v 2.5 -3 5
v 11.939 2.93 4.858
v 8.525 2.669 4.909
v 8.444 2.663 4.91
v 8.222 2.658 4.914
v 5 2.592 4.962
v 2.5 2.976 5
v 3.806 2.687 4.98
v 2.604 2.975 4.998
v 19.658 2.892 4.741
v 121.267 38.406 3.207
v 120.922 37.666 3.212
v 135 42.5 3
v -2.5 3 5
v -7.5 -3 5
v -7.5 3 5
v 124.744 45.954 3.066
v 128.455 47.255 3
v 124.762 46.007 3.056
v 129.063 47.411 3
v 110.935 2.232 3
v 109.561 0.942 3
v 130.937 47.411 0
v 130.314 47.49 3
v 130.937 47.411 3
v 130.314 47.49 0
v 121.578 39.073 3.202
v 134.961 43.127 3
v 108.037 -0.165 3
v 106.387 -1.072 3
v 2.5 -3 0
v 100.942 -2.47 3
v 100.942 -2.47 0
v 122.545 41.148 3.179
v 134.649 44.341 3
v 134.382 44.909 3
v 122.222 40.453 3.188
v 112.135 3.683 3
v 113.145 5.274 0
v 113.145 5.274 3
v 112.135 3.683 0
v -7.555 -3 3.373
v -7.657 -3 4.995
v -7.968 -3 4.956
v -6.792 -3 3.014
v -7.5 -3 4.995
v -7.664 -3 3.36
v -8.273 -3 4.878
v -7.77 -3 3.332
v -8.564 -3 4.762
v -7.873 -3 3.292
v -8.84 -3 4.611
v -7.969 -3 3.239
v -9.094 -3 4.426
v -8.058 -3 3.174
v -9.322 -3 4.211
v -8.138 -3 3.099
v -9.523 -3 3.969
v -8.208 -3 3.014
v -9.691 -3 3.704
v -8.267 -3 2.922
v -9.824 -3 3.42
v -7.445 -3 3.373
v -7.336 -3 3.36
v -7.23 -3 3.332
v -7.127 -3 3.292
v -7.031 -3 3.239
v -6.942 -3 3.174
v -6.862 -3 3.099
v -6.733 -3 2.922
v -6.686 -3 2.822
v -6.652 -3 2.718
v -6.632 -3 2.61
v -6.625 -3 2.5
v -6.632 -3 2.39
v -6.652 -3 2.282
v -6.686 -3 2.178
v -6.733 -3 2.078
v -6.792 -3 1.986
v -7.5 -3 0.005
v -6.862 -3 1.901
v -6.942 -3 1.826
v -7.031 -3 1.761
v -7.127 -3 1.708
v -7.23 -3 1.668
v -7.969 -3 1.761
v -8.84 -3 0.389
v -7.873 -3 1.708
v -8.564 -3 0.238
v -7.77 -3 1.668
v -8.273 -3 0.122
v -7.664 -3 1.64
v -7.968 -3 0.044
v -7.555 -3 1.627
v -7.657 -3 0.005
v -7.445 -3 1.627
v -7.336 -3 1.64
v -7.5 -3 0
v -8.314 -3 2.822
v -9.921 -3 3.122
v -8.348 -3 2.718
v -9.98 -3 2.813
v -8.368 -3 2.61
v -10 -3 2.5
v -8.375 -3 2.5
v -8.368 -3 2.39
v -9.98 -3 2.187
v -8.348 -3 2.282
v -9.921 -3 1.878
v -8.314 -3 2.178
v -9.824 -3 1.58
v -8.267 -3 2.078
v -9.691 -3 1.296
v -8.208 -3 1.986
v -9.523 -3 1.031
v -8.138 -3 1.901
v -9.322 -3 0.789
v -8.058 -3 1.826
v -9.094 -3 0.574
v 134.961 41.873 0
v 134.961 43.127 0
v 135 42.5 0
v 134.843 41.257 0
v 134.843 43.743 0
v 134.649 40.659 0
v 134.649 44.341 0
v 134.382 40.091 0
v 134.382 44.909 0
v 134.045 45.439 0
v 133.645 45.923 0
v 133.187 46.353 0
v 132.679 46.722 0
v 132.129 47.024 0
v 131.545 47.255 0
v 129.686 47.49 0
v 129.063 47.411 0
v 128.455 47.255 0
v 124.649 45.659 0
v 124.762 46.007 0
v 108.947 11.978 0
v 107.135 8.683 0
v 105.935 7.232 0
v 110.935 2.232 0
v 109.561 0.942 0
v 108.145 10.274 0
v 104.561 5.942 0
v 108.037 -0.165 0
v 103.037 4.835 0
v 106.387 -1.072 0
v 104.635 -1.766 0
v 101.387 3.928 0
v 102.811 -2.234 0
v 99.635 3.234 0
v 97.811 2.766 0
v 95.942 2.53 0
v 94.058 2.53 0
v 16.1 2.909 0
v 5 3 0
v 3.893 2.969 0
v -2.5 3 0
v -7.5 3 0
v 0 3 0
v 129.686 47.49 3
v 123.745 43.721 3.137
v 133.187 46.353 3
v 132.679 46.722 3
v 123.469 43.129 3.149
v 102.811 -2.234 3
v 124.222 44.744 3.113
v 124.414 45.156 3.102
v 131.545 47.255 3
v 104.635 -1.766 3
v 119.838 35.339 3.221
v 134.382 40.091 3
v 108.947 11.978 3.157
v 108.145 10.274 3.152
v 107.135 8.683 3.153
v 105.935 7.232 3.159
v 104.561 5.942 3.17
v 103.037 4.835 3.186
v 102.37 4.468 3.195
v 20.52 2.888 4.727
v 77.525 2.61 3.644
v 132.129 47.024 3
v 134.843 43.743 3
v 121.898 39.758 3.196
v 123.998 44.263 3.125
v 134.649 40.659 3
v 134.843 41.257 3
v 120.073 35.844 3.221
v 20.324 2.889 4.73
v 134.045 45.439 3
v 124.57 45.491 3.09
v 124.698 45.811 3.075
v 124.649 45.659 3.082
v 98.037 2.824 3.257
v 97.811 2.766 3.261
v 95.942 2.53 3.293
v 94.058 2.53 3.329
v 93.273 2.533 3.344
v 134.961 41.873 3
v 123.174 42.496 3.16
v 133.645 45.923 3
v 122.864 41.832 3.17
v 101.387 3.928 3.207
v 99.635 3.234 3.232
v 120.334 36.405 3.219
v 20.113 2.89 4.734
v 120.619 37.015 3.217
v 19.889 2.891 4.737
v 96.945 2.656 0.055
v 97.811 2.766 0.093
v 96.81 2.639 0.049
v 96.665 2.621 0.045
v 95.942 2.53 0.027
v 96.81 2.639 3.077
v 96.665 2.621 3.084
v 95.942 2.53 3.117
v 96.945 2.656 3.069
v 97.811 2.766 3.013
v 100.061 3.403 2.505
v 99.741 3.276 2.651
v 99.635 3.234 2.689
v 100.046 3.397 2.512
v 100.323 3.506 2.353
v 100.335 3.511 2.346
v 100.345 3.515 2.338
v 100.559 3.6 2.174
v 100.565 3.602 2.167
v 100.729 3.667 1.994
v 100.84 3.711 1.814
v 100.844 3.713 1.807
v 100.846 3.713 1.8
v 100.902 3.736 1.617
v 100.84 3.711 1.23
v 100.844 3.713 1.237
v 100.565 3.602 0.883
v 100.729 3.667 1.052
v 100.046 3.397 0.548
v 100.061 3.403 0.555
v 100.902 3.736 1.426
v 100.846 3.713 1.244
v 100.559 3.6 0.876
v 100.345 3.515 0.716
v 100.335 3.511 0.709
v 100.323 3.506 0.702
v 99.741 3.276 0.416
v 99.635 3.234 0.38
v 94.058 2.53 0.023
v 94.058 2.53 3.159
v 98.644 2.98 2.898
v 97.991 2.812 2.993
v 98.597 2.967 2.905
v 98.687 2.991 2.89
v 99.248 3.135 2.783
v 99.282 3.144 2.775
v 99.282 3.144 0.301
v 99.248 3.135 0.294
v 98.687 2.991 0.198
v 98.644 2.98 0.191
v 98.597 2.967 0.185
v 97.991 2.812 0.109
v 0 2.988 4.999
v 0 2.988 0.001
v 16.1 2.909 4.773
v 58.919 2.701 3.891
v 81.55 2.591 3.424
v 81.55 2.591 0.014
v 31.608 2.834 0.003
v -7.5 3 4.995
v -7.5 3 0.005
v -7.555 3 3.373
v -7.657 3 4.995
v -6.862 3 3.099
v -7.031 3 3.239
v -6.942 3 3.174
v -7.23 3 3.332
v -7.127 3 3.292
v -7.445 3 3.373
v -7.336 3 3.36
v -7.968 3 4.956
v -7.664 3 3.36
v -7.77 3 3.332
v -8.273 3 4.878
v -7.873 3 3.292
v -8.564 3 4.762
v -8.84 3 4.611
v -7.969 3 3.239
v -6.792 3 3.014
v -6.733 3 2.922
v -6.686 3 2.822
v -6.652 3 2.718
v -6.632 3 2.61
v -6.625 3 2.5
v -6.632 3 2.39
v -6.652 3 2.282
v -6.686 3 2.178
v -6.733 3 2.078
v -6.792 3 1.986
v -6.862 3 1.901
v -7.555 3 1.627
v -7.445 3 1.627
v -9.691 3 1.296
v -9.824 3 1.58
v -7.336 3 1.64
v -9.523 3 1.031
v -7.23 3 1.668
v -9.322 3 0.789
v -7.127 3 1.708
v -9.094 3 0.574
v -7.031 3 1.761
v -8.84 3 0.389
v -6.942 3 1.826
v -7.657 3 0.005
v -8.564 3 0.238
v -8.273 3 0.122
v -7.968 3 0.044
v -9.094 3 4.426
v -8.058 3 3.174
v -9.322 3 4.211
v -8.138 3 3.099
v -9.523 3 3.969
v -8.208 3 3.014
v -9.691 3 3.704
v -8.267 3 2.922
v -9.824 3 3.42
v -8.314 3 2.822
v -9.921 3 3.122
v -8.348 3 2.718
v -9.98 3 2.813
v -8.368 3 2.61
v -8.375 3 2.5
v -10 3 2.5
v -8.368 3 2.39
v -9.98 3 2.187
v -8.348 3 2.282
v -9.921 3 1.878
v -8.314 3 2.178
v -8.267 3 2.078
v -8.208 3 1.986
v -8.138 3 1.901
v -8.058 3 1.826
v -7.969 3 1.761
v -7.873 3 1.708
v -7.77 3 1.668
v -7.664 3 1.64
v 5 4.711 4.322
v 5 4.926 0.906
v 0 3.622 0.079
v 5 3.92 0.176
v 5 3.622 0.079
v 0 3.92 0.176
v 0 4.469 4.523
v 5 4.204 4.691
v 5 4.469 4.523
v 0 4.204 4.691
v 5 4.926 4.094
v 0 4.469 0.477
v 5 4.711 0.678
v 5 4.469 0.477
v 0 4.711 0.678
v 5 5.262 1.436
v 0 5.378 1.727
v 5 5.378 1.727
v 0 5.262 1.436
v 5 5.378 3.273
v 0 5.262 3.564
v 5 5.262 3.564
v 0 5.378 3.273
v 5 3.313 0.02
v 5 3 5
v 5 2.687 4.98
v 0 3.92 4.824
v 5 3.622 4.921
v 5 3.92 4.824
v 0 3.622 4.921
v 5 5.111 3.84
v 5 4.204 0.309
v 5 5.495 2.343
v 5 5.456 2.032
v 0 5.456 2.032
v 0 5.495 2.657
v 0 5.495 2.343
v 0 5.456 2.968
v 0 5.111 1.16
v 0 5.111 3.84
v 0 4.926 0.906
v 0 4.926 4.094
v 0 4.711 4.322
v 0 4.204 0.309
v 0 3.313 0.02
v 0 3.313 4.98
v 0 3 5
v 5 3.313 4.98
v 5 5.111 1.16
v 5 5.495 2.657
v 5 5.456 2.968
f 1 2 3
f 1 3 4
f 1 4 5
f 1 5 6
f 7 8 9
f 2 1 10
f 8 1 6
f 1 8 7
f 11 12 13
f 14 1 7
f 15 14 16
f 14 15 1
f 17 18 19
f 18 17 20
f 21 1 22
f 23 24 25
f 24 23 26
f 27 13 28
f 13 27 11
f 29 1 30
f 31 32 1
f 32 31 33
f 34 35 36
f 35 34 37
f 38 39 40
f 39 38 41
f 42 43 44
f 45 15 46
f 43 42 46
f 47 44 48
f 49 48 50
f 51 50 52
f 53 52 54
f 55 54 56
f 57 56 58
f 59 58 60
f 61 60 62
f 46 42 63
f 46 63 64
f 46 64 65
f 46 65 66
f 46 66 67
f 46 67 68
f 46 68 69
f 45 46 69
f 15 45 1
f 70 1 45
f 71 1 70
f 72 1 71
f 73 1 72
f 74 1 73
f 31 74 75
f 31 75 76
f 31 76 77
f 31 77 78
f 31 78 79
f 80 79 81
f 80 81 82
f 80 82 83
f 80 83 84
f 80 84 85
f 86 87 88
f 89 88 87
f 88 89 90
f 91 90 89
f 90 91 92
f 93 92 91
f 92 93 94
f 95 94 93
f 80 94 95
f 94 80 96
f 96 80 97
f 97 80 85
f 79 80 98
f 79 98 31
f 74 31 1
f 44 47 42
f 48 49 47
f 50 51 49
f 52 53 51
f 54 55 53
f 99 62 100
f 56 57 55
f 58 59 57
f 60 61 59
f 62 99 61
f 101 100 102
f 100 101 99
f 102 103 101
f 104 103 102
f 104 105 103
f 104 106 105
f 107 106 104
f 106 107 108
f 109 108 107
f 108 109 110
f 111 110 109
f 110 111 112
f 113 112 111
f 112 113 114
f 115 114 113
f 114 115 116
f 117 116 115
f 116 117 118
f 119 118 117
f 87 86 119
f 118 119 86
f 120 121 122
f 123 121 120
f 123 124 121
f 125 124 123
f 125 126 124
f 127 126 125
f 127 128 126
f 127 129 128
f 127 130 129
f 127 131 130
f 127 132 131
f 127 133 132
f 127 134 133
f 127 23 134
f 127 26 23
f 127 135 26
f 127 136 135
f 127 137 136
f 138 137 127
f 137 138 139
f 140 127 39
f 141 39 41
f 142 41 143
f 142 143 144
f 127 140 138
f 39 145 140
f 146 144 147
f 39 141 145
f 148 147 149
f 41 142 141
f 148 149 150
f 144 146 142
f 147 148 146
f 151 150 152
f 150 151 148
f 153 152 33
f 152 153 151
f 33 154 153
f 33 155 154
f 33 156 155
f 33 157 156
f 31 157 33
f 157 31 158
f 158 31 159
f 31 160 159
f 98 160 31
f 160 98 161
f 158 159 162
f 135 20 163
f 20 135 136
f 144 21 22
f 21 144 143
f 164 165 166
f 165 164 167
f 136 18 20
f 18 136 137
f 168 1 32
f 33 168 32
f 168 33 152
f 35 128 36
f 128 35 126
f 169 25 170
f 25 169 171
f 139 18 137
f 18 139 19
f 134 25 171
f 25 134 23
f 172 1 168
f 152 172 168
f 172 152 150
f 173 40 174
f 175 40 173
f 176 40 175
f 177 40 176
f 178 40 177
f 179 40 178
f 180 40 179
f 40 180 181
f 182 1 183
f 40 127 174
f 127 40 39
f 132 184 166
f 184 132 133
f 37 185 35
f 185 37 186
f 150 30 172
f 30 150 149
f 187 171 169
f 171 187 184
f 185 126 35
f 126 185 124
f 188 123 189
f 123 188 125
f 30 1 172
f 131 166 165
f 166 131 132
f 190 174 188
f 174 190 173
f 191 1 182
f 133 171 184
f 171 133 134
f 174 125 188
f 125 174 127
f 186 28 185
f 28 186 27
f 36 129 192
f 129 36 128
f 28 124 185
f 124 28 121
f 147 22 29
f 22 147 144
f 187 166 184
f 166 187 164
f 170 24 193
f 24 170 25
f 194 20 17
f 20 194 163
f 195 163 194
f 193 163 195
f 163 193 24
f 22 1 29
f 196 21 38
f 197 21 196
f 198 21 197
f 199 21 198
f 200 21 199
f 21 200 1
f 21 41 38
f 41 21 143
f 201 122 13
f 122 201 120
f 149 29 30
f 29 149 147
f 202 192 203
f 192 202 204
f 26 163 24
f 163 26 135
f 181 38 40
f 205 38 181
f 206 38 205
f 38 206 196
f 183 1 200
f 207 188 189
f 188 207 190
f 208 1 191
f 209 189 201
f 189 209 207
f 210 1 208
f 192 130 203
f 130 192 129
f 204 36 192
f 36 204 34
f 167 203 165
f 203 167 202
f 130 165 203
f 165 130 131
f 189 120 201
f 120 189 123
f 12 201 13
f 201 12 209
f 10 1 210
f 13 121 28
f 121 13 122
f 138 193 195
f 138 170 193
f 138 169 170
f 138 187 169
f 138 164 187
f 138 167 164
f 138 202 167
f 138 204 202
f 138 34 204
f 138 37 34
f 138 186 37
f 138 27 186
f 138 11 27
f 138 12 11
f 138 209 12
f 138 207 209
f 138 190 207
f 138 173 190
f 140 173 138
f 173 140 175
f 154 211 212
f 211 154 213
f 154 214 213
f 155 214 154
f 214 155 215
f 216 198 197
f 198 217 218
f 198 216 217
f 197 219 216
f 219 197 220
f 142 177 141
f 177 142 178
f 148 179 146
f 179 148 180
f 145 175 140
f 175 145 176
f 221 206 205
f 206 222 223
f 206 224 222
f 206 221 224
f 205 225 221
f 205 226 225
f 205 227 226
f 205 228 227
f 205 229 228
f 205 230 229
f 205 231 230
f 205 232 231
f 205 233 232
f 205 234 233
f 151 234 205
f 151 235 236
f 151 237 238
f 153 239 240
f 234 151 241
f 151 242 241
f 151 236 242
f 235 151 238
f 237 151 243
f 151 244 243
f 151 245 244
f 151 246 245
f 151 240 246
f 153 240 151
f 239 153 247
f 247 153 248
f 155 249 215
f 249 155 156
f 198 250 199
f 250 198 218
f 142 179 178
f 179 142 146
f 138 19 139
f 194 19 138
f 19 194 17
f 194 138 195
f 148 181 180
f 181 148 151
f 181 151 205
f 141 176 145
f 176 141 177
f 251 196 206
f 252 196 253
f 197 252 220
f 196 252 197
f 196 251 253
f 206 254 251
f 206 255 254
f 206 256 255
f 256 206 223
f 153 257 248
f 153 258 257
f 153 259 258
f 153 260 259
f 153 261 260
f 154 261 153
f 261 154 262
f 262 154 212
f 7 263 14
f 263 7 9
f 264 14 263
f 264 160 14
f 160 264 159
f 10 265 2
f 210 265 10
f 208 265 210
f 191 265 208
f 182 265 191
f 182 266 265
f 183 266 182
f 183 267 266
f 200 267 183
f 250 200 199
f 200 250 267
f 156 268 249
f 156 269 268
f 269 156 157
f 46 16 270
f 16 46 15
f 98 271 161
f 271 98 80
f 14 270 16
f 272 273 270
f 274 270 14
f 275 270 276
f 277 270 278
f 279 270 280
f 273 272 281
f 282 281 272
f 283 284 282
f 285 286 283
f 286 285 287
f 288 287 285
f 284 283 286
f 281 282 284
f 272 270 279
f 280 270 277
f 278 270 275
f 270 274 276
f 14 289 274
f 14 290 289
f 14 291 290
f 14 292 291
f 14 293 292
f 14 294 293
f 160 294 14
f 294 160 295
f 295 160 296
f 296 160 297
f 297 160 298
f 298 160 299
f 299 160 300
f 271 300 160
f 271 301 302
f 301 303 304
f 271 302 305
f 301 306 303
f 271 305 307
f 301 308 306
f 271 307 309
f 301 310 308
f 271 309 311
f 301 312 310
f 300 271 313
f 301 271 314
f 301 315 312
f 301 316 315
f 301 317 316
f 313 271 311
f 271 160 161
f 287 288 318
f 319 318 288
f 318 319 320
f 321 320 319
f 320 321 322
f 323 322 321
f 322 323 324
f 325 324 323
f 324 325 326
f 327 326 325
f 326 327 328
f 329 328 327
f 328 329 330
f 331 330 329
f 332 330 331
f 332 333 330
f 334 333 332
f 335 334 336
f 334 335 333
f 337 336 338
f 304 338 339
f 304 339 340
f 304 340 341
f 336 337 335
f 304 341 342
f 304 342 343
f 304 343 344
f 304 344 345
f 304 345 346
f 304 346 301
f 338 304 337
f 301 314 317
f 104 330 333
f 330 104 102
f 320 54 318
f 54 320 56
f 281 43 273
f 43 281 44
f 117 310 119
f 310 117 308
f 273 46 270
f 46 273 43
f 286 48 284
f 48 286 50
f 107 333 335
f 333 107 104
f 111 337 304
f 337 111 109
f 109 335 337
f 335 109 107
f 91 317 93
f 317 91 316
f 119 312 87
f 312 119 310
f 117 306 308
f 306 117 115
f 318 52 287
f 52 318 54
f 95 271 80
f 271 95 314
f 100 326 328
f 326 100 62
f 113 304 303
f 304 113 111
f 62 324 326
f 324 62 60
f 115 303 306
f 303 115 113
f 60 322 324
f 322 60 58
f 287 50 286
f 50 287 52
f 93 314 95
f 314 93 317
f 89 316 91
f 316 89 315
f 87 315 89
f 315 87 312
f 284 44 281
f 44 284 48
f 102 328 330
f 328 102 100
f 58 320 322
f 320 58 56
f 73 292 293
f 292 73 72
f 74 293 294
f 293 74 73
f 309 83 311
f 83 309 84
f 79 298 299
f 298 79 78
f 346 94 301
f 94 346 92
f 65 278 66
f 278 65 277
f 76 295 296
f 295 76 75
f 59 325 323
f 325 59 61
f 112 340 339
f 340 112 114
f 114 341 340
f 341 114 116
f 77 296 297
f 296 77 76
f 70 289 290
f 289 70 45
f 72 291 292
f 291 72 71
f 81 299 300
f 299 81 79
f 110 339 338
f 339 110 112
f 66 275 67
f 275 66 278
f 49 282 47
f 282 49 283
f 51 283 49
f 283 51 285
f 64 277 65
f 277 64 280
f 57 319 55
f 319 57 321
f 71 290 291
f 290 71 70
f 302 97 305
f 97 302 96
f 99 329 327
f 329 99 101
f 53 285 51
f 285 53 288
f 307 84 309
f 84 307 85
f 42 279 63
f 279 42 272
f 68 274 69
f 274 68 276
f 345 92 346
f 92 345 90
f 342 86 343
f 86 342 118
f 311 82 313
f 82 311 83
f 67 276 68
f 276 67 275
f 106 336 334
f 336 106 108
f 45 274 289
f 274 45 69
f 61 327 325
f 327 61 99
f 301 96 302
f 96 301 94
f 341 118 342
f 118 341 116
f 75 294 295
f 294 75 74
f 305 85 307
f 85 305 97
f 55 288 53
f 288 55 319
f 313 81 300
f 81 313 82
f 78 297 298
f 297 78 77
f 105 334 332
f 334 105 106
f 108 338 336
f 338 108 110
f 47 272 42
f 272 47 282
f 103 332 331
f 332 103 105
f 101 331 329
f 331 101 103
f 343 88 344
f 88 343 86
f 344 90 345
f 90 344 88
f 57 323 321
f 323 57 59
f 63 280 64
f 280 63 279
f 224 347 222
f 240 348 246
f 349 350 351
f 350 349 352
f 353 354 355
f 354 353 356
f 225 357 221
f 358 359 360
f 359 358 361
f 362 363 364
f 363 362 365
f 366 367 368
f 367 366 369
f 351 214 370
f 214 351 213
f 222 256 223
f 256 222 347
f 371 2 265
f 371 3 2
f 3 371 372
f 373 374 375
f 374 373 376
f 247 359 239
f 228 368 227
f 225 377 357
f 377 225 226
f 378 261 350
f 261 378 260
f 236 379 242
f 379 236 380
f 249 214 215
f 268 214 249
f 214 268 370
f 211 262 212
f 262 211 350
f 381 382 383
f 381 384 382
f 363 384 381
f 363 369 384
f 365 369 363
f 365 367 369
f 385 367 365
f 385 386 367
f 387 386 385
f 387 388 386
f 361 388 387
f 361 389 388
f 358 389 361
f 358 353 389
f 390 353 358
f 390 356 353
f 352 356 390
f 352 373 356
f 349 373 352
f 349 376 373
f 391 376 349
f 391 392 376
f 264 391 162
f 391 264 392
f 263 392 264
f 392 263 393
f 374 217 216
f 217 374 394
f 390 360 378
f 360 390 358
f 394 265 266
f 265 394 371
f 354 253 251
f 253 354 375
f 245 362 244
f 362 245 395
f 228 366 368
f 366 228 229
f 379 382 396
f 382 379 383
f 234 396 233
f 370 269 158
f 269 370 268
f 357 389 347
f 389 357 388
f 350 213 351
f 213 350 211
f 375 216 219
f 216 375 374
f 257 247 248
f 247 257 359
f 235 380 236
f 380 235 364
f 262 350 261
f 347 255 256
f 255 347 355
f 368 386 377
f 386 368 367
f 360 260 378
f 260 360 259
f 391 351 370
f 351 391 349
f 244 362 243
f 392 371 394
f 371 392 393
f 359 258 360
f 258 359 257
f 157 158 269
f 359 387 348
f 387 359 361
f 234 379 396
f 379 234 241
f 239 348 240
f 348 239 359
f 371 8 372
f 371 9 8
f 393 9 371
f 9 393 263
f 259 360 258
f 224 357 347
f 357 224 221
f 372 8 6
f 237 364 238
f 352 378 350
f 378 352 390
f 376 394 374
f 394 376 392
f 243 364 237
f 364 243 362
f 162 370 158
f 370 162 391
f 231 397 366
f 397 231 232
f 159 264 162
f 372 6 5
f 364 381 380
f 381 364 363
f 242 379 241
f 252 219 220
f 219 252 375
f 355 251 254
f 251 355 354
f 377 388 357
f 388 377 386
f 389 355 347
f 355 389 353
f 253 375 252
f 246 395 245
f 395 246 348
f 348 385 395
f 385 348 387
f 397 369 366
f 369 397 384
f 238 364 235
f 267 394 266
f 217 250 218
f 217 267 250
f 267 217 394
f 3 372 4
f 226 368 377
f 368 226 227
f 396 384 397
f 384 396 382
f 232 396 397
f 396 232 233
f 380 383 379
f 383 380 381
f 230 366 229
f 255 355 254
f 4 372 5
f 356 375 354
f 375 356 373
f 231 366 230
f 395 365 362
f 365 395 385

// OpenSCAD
Stem_Length=100;
Stem_Width=5;
Stem_Thickness=3;
Stem_Curve_Length=30;
Hinge_Pin_Diameter=1.75;
Hinge_Width=6;
Hinge_Length=5;
Hinge_Thickness=5;
Slider_Thickness=4;
Tube_Diameter=11;
Tube_Inner_Diameter=8;
Tube_Compressed_Thickness=1.2;
Tube_Compressed_Width=18;
Tube_Holder_Wall_Thickness=3;
Outlet_Tube_Inner_Diameter=3;
$fn=50;


//Plug();

//End_Cap();

//Slider();

Stem();

//Tube_Holder();

module Complete_Syringe(){
translate([30,(Tube_Diameter/3+Tube_Holder_Wall_Thickness),(Tube_Diameter/3+Tube_Holder_Wall_Thickness)])
rotate([90,0,90])
Slider();

translate([0,(Tube_Diameter/3+Tube_Holder_Wall_Thickness),(Tube_Diameter/3+Tube_Holder_Wall_Thickness)])
rotate([90,0,90])
End_Thing();

translate([0,Tube_Diameter/2+Tube_Holder_Wall_Thickness-2,Tube_Diameter/2+Tube_Holder_Wall_Thickness-2])rotate([0,0,90])Tube_Holder();

}


module End_Stop_Plug(){

difference(){

	union(){

		cylinder(2.5, Tube_Inner_Diameter/2+.5, Tube_Inner_Diameter/2+1);

		translate([0,0,2.5])
			cylinder(2.5, Tube_Inner_Diameter/2+.5, Tube_Inner_Diameter/2+1);
	}

	translate([Tube_Inner_Diameter/2+1,0,-1])
		cylinder(7, 1.5, 1.5);

	translate([Tube_Inner_Diameter/-2-1,0,-1])
		cylinder(7, 1.5, 1.5);

}

}
module End_Cap(){

difference(){

	cylinder(5, Tube_Diameter/2+Tube_Holder_Wall_Thickness*2, Tube_Diameter/2+Tube_Holder_Wall_Thickness*2);

	difference(){	
	
		translate([0,0,-1])		
			cylinder(7, Tube_Diameter/2+Tube_Holder_Wall_Thickness, Tube_Diameter/2+Tube_Holder_Wall_Thickness);

		hull(){
		
			translate([0,(Tube_Compressed_Thickness/-2+-Slider_Thickness)+Tube_Diameter,(Tube_Diameter+Tube_Holder_Wall_Thickness*2+2)/-2])
				cylinder(Tube_Diameter+Tube_Holder_Wall_Thickness*2+2, Tube_Compressed_Thickness/2+Slider_Thickness-.5, Tube_Compressed_Thickness/2+Slider_Thickness-.5);

			translate([0,(Tube_Compressed_Thickness/2+Slider_Thickness)-Tube_Diameter,(Tube_Diameter+Tube_Holder_Wall_Thickness*2+2)/-2])


				cylinder(Tube_Diameter+Tube_Holder_Wall_Thickness*2+2-.5, Tube_Compressed_Thickness/2+Slider_Thickness, Tube_Compressed_Thickness/2+Slider_Thickness-.5);

		} 

	}

	translate([0,0,-1])
		cylinder(7,Tube_Diameter/2+1, Tube_Diameter/2+1);
		
}

	translate([0,0,3])
		rotate([0,0,0])
			rotate_extrude(convexity = 10)
				translate([Tube_Diameter/2+Tube_Holder_Wall_Thickness, 0, 0])
					circle(r = .5, $fn = 100);

}

module Plug(){

difference(){

	union(){

		cylinder(2.5, Tube_Inner_Diameter/2+.5, Tube_Inner_Diameter/2+1.25);

		translate([0,0,2.5])
			cylinder(2.5, Tube_Inner_Diameter/2+.5, Tube_Inner_Diameter/2+1.25);

		translate([0,0,5])
			cylinder(2.5, Outlet_Tube_Inner_Diameter/2+1, Outlet_Tube_Inner_Diameter/2+.5);

		translate([0,0,7.5])
			cylinder(2.5, Outlet_Tube_Inner_Diameter/2+1, Outlet_Tube_Inner_Diameter/2+.5);

}

	translate([0,0,-1])
		cylinder(12,Outlet_Tube_Inner_Diameter/2-.5,Outlet_Tube_Inner_Diameter/2-.5);

	translate([0,0,-1])
		cylinder(6, Tube_Inner_Diameter/2-.5, Outlet_Tube_Inner_Diameter/2-.5);

}
}

module Slider()
{
scale([1.05,1.05,1])
difference()
	{

	cylinder(h = Slider_Thickness, r = Tube_Diameter/2+Tube_Holder_Wall_Thickness+Slider_Thickness);

	translate([0,0,-1])
		cylinder(h = Slider_Thickness+2, r = Tube_Diameter/2+Tube_Holder_Wall_Thickness);
	}

hull()
	{

	translate([Tube_Compressed_Thickness+Slider_Thickness/4,
				 Tube_Diameter/2+Tube_Holder_Wall_Thickness+1, 
				 Slider_Thickness/4])
		rotate([90,0,0])
			cylinder(h = Tube_Diameter+Tube_Holder_Wall_Thickness*2+2, r = Slider_Thickness/4); 

	translate([Tube_Compressed_Thickness+Slider_Thickness/4,
				 Tube_Diameter/2+Tube_Holder_Wall_Thickness+1, 
				 Slider_Thickness-(Slider_Thickness/4)])
		rotate([90,0,0])
			cylinder(h = Tube_Diameter+Tube_Holder_Wall_Thickness*2+2, r = Slider_Thickness/4); 
	}

hull()
	{
	translate([-Tube_Compressed_Thickness+Slider_Thickness/-4,
				 Tube_Diameter/2+Tube_Holder_Wall_Thickness+1, 
				 Slider_Thickness/4])
		rotate([90,0,0])
			cylinder(h = Tube_Diameter+Tube_Holder_Wall_Thickness*2+2, r = Slider_Thickness/4); 

	translate([-Tube_Compressed_Thickness+Slider_Thickness/-4,
				 Tube_Diameter/2+Tube_Holder_Wall_Thickness+1, 
				 Slider_Thickness-(Slider_Thickness/4)])
		rotate([90,0,0])
			cylinder(h = Tube_Diameter+Tube_Holder_Wall_Thickness*2+2, r = Slider_Thickness/4); 
	}

}

module Tube_Holder(){

difference(){

	rotate([90,0,0])
		cylinder(Stem_Length, Tube_Diameter/2+Tube_Holder_Wall_Thickness, Tube_Diameter/2+Tube_Holder_Wall_Thickness);

	translate([0,1,0])
		rotate([90,0,0])
			cylinder(Stem_Length+2, Tube_Diameter/2, Tube_Diameter/2);

	translate([0,1,0])
		rotate([90,0,0])
			cylinder(h = 6, r = Tube_Diameter/2+.5);


	translate([0, Stem_Length/-2,(Tube_Diameter+Tube_Holder_Wall_Thickness*2)/-1+2])
		cube([ Tube_Diameter+Tube_Holder_Wall_Thickness*2+2,
				Stem_Length+2,
				Tube_Diameter+Tube_Holder_Wall_Thickness*2], 
				center = true);

	hull(){
		
		translate([0,0,(Tube_Diameter+Tube_Holder_Wall_Thickness*2+2)/-2])
			cylinder( h = Tube_Diameter+Tube_Holder_Wall_Thickness*2+2, 
						r = Tube_Compressed_Thickness/2+Slider_Thickness);

		translate([0,
					(Tube_Compressed_Thickness/2+Slider_Thickness)-Stem_Length+Tube_Holder_Wall_Thickness,						(Tube_Diameter+Tube_Holder_Wall_Thickness*2+2)/-2])
			cylinder( h = Tube_Diameter+Tube_Holder_Wall_Thickness*2+2, 
						r = Tube_Compressed_Thickness/2+Slider_Thickness);
			} 

	translate([0,-3,0])
		rotate([90,0,0])
			rotate_extrude(convexity = 10)
				translate([Tube_Diameter/2+Tube_Holder_Wall_Thickness, 0, 0])
					circle(r = 1, $fn = 100);


}

}


module Stem()
{
hull()
{
translate([0,3,2.5])
rotate([0,90,0])
cylinder(h = Stem_Width, r = Hinge_Thickness/2);
translate([Stem_Length,2.2,1.5])
rotate([0,90,0])
cylinder(h = Stem_Thickness, r = (Stem_Thickness)/2);
}
difference()
	{
hull()
		{

	translate([0,0,Hinge_Thickness/2])
		cube([Stem_Width, Hinge_Width, Hinge_Thickness], center = true);

	translate([Stem_Length,Stem_Width*2.5,0])
		cylinder(h = Stem_Thickness, r = Stem_Width*3);

	translate([Stem_Length+Stem_Curve_Length,Stem_Width*2.5+Stem_Curve_Length,0])
		cylinder(h = Stem_Thickness, r = Stem_Width);
		}


translate([0,Stem_Width,0])
hull()
		{
	translate([0,Hinge_Width/2-Stem_Width/2,(Hinge_Thickness+1)/2])
		cube([Stem_Width, Stem_Width, Hinge_Thickness+2], center = true);

	translate([Stem_Length-Stem_Width,Stem_Width*2.5,-1])
		cylinder(Stem_Thickness+2, Stem_Width*3, Stem_Width*3);

	translate([Stem_Length+Stem_Curve_Length-Stem_Width*2,Stem_Width*2.5+Stem_Curve_Length,-1])
		cylinder(Stem_Thickness+2, Stem_Width, Stem_Width);
		}
	}

difference()
	{
	union()
		{
		translate([-Hinge_Length,0,Hinge_Thickness/2])
			cube([Hinge_Length, Hinge_Width, Hinge_Thickness], center = true);

		translate([-Hinge_Length-Hinge_Thickness/2,(Hinge_Width)/2,Hinge_Thickness/2])	
rotate([90,0,0])
			#cylinder(h = Hinge_Width, r = Hinge_Thickness/2);
		}
		

	translate([-Hinge_Length-Hinge_Thickness/2,(Hinge_Width+2)/2,Hinge_Thickness/2])	
		rotate([90,0,0])
			cylinder(h = Hinge_Width+2, r = Hinge_Pin_Diameter/2);
	}	

}

